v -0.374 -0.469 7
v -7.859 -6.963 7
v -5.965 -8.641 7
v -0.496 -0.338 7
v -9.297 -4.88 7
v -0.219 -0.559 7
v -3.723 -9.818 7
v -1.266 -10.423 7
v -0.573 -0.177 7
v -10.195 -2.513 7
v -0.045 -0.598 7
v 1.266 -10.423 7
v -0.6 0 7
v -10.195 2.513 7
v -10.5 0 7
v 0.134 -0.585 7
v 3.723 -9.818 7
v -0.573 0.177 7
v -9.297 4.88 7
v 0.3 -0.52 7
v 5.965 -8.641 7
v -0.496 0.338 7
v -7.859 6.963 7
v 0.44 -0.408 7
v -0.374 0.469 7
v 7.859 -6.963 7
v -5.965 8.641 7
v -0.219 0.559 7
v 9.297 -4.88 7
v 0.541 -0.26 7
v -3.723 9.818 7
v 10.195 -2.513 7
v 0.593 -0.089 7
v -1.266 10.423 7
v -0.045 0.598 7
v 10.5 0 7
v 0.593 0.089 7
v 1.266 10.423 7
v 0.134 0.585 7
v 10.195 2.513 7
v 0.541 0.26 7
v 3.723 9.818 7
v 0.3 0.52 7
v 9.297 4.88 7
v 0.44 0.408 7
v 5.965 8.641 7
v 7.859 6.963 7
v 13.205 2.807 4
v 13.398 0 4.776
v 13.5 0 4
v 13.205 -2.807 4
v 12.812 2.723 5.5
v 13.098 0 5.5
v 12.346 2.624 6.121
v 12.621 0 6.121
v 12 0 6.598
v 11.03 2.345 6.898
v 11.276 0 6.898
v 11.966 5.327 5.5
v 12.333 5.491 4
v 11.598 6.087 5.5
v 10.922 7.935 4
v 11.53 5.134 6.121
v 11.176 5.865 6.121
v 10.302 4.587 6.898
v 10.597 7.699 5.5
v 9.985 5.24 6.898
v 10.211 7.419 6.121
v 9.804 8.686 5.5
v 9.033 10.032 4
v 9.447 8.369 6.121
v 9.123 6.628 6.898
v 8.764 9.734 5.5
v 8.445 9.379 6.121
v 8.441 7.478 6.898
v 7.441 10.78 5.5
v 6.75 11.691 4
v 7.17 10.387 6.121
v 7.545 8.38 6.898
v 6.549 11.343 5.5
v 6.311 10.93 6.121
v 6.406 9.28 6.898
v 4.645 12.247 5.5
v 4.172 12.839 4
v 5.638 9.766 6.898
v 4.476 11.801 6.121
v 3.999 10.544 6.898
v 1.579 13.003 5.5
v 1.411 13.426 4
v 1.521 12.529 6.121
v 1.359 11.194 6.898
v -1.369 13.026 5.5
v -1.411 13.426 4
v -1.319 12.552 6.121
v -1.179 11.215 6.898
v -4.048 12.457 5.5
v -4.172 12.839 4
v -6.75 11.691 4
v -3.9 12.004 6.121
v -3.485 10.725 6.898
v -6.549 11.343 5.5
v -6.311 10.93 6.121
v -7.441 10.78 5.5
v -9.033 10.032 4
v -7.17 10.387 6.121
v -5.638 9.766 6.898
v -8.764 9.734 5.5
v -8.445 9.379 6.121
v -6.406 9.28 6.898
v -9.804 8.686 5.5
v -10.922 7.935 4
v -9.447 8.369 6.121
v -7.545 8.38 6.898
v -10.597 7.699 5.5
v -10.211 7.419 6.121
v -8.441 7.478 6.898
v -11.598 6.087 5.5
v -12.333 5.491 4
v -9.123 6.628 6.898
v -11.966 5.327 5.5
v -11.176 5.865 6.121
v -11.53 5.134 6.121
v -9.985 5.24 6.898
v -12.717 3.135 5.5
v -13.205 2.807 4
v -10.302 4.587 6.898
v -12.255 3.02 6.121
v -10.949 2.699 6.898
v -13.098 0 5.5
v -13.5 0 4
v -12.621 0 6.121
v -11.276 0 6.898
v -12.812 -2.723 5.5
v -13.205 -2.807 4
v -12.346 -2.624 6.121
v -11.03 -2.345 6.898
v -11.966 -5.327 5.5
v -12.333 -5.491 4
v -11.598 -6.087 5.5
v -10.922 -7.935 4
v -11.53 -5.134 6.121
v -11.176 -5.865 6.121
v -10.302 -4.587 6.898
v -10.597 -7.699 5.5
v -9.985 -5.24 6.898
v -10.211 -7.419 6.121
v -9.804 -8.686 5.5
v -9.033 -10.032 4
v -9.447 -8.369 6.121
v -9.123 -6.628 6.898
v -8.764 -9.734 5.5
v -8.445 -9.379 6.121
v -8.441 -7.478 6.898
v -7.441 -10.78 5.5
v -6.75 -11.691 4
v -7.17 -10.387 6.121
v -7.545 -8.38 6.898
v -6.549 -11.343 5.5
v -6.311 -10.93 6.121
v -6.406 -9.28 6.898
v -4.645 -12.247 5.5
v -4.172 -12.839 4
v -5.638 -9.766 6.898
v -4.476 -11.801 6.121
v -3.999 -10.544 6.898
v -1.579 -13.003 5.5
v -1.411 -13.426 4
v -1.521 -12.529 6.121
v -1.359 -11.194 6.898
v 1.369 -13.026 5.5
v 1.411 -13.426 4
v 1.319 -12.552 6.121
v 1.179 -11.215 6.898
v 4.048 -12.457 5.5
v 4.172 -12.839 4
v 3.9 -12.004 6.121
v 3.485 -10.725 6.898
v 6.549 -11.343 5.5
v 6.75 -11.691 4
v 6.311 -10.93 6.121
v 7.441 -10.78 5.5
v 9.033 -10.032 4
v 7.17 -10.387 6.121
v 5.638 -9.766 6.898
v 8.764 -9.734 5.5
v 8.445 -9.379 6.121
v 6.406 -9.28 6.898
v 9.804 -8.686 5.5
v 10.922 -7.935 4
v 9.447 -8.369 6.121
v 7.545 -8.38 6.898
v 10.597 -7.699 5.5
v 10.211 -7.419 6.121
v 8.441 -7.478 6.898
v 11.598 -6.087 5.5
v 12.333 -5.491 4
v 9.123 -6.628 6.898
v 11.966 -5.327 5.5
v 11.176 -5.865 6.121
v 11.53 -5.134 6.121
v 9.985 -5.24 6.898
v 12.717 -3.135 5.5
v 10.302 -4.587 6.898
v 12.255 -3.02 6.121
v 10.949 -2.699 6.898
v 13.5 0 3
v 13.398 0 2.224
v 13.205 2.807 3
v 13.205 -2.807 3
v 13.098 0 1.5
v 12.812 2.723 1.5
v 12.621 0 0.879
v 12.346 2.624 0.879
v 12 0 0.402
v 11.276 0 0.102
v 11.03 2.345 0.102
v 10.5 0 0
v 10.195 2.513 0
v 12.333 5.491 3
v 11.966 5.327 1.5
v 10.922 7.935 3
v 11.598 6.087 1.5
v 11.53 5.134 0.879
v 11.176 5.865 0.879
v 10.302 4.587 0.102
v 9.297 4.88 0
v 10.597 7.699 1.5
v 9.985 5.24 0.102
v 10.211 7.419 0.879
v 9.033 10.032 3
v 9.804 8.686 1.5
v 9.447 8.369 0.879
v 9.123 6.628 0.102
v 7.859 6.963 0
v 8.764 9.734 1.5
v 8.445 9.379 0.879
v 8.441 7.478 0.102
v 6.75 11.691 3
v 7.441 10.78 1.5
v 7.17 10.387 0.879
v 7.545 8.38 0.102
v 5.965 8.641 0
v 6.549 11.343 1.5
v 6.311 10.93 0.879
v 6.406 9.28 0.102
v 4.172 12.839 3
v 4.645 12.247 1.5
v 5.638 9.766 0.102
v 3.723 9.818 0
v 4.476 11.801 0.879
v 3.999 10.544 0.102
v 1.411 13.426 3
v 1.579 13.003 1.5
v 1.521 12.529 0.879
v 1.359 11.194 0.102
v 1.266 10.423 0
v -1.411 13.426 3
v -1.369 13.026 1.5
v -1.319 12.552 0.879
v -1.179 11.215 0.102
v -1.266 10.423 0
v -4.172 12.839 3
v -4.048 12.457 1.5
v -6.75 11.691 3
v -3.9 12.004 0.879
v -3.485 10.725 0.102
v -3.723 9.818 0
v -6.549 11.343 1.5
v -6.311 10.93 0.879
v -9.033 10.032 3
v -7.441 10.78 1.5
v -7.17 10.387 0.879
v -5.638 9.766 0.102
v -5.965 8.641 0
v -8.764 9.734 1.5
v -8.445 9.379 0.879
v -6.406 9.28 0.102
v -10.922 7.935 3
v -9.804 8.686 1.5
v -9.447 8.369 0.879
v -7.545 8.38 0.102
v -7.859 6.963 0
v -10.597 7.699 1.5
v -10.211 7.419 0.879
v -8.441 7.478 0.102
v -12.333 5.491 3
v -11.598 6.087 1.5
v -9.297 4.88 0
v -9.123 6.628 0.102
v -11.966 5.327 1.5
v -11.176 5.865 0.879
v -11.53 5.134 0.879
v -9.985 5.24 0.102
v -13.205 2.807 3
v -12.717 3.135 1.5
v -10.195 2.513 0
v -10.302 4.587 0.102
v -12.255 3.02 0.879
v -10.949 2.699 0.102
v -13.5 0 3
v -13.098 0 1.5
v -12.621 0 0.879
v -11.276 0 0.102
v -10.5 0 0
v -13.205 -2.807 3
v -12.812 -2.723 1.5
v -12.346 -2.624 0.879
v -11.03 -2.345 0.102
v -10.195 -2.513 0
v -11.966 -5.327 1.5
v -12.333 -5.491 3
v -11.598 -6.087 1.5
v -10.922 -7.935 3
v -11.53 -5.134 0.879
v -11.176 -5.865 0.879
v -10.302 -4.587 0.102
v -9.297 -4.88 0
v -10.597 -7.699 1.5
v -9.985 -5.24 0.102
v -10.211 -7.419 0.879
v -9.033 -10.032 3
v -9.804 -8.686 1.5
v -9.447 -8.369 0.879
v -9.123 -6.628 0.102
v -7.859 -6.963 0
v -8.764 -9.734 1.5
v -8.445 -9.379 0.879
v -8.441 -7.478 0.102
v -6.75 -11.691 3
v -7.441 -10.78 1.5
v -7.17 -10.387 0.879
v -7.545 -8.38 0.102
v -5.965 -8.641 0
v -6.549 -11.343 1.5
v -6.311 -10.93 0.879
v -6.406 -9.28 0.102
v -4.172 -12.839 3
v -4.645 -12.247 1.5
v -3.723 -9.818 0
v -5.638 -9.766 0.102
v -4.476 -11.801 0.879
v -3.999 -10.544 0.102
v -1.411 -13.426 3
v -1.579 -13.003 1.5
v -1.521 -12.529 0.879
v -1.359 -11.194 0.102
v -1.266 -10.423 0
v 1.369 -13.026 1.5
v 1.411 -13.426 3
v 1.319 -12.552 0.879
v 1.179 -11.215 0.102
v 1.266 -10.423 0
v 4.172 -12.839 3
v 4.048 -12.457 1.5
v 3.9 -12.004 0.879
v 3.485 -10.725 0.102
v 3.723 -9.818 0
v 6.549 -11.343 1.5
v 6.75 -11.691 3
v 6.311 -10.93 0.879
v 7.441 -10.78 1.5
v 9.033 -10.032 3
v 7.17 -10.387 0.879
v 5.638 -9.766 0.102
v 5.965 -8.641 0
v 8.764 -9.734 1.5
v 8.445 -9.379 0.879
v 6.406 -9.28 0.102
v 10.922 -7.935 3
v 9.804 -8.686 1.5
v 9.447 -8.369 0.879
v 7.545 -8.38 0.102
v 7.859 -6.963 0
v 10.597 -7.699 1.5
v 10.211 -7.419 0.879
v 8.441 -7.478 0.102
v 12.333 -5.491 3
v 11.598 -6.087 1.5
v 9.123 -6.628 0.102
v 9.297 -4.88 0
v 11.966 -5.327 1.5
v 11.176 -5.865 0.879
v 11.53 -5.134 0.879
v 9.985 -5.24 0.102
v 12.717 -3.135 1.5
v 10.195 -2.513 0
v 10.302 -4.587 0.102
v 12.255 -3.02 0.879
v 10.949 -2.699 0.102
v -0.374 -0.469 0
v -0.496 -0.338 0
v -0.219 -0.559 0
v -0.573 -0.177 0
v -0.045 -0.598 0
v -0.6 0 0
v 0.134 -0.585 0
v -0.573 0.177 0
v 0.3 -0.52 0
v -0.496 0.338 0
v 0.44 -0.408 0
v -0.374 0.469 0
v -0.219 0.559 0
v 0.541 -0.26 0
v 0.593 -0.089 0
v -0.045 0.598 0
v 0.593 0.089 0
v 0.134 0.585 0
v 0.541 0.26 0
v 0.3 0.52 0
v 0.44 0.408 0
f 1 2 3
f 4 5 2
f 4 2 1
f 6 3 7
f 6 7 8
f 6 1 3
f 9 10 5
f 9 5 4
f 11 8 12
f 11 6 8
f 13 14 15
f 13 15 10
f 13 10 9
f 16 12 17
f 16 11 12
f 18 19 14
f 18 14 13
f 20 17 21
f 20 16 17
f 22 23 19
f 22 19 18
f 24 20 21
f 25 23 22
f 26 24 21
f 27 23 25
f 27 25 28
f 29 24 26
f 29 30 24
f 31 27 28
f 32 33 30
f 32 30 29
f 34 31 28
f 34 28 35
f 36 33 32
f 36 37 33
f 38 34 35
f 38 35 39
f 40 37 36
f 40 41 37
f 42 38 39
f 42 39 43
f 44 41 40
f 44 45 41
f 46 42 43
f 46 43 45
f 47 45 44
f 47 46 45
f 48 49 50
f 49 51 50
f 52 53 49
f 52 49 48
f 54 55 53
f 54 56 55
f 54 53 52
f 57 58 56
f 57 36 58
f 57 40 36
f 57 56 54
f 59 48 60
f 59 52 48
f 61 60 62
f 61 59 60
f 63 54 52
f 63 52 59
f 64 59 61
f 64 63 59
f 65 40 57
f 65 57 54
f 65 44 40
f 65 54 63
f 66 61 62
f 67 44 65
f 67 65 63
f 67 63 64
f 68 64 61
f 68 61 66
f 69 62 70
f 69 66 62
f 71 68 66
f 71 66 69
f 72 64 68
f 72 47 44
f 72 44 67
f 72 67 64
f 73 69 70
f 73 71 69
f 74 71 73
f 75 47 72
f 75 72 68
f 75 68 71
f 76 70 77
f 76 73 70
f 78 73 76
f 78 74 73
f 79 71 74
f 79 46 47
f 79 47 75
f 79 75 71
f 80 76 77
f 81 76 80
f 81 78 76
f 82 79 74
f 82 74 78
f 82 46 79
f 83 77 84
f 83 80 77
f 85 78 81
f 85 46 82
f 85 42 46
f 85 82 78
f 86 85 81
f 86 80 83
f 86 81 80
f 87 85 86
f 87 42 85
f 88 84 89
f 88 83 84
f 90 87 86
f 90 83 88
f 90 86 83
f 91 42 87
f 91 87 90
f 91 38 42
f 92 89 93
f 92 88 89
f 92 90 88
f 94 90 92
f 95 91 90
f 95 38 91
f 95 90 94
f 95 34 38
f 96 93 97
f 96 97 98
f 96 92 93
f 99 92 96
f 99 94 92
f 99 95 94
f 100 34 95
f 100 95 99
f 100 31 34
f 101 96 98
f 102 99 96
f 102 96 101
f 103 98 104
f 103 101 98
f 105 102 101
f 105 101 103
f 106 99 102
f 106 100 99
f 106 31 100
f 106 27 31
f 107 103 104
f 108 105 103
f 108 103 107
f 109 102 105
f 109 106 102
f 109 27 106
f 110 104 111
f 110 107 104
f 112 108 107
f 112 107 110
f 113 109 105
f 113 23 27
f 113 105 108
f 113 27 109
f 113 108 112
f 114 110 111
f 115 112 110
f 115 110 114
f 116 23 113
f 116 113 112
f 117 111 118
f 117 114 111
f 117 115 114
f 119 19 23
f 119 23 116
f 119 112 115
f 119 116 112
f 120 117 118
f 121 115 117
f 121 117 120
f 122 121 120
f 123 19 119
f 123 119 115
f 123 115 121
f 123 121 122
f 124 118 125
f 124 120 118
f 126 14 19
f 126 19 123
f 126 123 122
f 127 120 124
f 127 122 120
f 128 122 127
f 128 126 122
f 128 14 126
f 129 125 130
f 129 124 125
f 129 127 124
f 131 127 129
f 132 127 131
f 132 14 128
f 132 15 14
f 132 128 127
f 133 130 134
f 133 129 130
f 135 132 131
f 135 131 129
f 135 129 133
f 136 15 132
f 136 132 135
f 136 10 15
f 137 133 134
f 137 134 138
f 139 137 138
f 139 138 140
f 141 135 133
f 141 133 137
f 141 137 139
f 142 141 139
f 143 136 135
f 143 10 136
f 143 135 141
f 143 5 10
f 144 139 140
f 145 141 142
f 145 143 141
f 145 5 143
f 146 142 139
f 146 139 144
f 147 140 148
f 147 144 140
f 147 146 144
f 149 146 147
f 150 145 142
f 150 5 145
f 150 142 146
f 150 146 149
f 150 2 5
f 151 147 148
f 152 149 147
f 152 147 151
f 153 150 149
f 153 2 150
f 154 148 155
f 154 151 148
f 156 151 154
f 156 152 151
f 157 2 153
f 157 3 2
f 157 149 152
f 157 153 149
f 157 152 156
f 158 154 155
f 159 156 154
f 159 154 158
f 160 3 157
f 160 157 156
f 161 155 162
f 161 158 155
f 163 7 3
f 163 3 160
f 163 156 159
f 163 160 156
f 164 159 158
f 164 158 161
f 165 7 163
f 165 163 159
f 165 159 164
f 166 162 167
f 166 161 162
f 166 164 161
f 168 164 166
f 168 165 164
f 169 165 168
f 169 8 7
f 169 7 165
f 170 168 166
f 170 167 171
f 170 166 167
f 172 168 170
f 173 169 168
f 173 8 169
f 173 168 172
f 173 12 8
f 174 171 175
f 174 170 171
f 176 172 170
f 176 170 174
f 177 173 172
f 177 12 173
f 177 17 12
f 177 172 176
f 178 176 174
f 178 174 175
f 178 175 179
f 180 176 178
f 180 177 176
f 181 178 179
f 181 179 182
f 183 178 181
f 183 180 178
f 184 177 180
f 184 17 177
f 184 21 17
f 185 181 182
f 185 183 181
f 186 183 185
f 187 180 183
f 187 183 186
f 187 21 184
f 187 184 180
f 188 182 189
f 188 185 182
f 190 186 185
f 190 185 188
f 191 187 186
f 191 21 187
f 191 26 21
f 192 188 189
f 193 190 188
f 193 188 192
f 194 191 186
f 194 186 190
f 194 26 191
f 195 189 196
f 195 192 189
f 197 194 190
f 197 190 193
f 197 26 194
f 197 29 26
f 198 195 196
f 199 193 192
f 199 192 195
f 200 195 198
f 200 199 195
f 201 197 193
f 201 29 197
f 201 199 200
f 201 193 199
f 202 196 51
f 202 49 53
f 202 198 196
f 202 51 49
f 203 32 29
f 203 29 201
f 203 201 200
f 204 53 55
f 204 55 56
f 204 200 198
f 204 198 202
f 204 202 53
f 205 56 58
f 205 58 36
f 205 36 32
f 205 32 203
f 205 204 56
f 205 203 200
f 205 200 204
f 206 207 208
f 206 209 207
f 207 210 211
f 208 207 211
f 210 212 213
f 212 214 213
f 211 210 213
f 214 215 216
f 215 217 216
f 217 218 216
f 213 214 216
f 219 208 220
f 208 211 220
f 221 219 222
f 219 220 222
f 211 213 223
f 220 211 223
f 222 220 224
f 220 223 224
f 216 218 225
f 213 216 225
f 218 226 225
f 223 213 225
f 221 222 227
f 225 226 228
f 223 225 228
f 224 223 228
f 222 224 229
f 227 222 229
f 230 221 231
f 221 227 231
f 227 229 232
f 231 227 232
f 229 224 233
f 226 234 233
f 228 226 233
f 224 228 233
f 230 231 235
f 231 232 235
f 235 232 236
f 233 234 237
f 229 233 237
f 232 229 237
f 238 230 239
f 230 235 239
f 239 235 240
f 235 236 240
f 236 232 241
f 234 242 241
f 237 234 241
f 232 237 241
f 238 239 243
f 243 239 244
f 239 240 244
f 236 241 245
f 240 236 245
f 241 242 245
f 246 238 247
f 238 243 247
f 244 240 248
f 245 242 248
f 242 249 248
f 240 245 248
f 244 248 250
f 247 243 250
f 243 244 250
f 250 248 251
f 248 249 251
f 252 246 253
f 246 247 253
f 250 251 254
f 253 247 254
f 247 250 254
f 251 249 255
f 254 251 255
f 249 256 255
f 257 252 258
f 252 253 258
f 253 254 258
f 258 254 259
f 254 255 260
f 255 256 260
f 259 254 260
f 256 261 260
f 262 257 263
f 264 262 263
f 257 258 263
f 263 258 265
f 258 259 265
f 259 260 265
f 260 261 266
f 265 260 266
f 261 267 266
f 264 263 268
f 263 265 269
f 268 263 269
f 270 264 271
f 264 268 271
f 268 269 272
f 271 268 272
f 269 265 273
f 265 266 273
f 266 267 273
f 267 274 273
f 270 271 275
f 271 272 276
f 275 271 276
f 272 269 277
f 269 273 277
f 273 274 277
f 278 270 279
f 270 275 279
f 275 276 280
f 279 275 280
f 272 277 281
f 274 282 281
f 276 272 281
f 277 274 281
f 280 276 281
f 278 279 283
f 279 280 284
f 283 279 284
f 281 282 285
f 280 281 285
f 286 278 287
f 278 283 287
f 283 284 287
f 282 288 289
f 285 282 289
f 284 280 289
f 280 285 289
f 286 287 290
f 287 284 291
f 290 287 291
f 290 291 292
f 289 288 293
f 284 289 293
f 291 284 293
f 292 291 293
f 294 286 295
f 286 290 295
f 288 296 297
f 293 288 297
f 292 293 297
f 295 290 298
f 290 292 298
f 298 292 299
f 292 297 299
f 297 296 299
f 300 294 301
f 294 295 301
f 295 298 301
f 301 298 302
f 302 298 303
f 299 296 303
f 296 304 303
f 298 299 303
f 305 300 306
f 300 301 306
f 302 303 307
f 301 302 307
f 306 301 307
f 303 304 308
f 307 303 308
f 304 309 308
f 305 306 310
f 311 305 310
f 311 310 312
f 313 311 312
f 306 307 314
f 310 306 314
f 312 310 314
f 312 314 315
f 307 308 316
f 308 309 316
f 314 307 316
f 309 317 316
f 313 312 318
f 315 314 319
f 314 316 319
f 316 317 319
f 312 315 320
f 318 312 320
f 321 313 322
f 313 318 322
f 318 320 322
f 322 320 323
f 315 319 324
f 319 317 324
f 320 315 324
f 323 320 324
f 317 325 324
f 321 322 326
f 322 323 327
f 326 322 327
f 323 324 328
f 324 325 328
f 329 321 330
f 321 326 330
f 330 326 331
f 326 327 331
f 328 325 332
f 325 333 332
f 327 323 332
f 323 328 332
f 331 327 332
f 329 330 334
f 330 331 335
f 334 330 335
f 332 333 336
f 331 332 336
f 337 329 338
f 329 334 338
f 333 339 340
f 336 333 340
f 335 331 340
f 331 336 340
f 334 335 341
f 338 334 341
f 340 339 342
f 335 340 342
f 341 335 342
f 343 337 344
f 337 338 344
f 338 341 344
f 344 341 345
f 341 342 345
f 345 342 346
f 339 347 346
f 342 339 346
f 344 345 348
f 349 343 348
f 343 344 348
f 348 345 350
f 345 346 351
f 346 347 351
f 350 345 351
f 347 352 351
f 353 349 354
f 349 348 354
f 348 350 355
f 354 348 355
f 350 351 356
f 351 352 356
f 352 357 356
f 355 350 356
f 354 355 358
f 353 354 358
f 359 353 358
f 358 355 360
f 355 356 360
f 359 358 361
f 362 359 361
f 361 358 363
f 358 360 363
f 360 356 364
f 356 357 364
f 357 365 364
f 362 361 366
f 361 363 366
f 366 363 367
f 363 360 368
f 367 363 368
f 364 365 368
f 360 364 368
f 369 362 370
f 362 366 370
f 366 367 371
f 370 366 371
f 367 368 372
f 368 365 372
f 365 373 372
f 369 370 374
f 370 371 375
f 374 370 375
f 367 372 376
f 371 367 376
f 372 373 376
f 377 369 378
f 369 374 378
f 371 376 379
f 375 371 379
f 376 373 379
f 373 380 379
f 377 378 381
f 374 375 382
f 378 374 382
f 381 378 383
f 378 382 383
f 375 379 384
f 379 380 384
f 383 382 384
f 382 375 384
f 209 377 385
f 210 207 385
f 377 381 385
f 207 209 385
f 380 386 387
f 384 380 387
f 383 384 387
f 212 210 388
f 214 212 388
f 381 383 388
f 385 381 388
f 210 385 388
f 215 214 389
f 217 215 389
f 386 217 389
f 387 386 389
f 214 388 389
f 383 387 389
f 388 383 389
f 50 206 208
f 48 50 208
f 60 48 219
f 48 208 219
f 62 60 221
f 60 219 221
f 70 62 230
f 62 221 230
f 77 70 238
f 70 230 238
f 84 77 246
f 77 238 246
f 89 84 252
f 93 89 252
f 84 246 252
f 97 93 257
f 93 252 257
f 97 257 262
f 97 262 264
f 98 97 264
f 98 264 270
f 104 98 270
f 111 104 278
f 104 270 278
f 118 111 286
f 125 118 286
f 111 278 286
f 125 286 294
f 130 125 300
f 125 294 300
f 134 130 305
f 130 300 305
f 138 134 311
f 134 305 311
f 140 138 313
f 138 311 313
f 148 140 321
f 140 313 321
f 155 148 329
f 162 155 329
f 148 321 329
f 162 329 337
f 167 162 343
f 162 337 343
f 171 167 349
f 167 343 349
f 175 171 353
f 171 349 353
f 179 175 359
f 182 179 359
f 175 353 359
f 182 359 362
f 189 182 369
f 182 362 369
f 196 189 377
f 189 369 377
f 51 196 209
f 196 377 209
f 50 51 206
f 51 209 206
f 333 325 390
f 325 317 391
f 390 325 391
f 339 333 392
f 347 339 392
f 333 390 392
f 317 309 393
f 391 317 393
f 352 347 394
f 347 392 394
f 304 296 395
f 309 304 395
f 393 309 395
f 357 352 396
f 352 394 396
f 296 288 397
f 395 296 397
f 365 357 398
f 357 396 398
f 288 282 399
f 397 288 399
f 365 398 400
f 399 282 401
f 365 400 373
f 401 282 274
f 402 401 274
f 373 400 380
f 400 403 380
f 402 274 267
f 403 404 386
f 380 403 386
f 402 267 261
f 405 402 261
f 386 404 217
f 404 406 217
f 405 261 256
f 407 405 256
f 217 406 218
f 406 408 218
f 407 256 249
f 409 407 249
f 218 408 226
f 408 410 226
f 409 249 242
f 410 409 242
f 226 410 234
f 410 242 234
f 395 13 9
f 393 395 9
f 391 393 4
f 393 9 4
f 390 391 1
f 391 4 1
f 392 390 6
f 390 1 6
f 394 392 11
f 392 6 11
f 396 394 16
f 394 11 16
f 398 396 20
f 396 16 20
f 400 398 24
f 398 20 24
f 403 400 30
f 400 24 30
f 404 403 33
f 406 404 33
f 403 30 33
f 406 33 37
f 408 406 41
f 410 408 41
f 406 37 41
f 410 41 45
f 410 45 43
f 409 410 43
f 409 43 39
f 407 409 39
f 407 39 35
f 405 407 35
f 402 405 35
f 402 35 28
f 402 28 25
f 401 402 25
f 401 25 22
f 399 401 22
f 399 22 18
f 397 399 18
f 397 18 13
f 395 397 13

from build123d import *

# Parameters (mm, degrees)
F0_R     = 13.5
F1_DEPTH = 7
F2_D     = 1.2
F3_R     = 3


with BuildPart() as f1:
    # F0 (on Top) → F1 (new body)
    with BuildSketch(Plane.XY):
        Circle(F0_R)
    extrude(amount=F1_DEPTH)

    # F2 (through all)
    with Locations(Plane(origin=(0, 0, 0), x_dir=(1, 0, 0), z_dir=(0, 0, -1))):
        with Locations((0, 0)):
            Hole(F2_D / 2)

    # F3
    f3_edges = [f1.edges().sort_by_distance(p)[0] for p in [
        (-13.5, 0, 0),
        (-13.5, 0, 7),
    ]]
    fillet(f3_edges, radius=F3_R)


solid = f1.part
